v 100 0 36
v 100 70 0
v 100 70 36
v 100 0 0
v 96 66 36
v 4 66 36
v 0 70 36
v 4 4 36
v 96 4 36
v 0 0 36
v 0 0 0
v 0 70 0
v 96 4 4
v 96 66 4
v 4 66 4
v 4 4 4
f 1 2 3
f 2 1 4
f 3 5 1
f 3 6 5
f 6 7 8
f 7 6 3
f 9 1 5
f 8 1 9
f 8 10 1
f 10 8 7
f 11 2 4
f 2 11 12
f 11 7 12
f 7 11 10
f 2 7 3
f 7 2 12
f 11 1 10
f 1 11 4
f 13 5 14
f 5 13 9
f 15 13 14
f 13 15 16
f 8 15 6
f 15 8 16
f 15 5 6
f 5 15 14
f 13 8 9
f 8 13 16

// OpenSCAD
// ScadLatch example — parametric desktop tray, dimensions in millimetres.
// Change width after adding an opening to the right wall.
width = 100;
depth = 70;
height = 36;
wall = 4;

module tray(w, d, h, t) {
    difference() {
        cube([w, d, h]);
        translate([t, t, t]) cube([w-2*t, d-2*t, h]);
    }
}
tray(width, depth, height, wall);
